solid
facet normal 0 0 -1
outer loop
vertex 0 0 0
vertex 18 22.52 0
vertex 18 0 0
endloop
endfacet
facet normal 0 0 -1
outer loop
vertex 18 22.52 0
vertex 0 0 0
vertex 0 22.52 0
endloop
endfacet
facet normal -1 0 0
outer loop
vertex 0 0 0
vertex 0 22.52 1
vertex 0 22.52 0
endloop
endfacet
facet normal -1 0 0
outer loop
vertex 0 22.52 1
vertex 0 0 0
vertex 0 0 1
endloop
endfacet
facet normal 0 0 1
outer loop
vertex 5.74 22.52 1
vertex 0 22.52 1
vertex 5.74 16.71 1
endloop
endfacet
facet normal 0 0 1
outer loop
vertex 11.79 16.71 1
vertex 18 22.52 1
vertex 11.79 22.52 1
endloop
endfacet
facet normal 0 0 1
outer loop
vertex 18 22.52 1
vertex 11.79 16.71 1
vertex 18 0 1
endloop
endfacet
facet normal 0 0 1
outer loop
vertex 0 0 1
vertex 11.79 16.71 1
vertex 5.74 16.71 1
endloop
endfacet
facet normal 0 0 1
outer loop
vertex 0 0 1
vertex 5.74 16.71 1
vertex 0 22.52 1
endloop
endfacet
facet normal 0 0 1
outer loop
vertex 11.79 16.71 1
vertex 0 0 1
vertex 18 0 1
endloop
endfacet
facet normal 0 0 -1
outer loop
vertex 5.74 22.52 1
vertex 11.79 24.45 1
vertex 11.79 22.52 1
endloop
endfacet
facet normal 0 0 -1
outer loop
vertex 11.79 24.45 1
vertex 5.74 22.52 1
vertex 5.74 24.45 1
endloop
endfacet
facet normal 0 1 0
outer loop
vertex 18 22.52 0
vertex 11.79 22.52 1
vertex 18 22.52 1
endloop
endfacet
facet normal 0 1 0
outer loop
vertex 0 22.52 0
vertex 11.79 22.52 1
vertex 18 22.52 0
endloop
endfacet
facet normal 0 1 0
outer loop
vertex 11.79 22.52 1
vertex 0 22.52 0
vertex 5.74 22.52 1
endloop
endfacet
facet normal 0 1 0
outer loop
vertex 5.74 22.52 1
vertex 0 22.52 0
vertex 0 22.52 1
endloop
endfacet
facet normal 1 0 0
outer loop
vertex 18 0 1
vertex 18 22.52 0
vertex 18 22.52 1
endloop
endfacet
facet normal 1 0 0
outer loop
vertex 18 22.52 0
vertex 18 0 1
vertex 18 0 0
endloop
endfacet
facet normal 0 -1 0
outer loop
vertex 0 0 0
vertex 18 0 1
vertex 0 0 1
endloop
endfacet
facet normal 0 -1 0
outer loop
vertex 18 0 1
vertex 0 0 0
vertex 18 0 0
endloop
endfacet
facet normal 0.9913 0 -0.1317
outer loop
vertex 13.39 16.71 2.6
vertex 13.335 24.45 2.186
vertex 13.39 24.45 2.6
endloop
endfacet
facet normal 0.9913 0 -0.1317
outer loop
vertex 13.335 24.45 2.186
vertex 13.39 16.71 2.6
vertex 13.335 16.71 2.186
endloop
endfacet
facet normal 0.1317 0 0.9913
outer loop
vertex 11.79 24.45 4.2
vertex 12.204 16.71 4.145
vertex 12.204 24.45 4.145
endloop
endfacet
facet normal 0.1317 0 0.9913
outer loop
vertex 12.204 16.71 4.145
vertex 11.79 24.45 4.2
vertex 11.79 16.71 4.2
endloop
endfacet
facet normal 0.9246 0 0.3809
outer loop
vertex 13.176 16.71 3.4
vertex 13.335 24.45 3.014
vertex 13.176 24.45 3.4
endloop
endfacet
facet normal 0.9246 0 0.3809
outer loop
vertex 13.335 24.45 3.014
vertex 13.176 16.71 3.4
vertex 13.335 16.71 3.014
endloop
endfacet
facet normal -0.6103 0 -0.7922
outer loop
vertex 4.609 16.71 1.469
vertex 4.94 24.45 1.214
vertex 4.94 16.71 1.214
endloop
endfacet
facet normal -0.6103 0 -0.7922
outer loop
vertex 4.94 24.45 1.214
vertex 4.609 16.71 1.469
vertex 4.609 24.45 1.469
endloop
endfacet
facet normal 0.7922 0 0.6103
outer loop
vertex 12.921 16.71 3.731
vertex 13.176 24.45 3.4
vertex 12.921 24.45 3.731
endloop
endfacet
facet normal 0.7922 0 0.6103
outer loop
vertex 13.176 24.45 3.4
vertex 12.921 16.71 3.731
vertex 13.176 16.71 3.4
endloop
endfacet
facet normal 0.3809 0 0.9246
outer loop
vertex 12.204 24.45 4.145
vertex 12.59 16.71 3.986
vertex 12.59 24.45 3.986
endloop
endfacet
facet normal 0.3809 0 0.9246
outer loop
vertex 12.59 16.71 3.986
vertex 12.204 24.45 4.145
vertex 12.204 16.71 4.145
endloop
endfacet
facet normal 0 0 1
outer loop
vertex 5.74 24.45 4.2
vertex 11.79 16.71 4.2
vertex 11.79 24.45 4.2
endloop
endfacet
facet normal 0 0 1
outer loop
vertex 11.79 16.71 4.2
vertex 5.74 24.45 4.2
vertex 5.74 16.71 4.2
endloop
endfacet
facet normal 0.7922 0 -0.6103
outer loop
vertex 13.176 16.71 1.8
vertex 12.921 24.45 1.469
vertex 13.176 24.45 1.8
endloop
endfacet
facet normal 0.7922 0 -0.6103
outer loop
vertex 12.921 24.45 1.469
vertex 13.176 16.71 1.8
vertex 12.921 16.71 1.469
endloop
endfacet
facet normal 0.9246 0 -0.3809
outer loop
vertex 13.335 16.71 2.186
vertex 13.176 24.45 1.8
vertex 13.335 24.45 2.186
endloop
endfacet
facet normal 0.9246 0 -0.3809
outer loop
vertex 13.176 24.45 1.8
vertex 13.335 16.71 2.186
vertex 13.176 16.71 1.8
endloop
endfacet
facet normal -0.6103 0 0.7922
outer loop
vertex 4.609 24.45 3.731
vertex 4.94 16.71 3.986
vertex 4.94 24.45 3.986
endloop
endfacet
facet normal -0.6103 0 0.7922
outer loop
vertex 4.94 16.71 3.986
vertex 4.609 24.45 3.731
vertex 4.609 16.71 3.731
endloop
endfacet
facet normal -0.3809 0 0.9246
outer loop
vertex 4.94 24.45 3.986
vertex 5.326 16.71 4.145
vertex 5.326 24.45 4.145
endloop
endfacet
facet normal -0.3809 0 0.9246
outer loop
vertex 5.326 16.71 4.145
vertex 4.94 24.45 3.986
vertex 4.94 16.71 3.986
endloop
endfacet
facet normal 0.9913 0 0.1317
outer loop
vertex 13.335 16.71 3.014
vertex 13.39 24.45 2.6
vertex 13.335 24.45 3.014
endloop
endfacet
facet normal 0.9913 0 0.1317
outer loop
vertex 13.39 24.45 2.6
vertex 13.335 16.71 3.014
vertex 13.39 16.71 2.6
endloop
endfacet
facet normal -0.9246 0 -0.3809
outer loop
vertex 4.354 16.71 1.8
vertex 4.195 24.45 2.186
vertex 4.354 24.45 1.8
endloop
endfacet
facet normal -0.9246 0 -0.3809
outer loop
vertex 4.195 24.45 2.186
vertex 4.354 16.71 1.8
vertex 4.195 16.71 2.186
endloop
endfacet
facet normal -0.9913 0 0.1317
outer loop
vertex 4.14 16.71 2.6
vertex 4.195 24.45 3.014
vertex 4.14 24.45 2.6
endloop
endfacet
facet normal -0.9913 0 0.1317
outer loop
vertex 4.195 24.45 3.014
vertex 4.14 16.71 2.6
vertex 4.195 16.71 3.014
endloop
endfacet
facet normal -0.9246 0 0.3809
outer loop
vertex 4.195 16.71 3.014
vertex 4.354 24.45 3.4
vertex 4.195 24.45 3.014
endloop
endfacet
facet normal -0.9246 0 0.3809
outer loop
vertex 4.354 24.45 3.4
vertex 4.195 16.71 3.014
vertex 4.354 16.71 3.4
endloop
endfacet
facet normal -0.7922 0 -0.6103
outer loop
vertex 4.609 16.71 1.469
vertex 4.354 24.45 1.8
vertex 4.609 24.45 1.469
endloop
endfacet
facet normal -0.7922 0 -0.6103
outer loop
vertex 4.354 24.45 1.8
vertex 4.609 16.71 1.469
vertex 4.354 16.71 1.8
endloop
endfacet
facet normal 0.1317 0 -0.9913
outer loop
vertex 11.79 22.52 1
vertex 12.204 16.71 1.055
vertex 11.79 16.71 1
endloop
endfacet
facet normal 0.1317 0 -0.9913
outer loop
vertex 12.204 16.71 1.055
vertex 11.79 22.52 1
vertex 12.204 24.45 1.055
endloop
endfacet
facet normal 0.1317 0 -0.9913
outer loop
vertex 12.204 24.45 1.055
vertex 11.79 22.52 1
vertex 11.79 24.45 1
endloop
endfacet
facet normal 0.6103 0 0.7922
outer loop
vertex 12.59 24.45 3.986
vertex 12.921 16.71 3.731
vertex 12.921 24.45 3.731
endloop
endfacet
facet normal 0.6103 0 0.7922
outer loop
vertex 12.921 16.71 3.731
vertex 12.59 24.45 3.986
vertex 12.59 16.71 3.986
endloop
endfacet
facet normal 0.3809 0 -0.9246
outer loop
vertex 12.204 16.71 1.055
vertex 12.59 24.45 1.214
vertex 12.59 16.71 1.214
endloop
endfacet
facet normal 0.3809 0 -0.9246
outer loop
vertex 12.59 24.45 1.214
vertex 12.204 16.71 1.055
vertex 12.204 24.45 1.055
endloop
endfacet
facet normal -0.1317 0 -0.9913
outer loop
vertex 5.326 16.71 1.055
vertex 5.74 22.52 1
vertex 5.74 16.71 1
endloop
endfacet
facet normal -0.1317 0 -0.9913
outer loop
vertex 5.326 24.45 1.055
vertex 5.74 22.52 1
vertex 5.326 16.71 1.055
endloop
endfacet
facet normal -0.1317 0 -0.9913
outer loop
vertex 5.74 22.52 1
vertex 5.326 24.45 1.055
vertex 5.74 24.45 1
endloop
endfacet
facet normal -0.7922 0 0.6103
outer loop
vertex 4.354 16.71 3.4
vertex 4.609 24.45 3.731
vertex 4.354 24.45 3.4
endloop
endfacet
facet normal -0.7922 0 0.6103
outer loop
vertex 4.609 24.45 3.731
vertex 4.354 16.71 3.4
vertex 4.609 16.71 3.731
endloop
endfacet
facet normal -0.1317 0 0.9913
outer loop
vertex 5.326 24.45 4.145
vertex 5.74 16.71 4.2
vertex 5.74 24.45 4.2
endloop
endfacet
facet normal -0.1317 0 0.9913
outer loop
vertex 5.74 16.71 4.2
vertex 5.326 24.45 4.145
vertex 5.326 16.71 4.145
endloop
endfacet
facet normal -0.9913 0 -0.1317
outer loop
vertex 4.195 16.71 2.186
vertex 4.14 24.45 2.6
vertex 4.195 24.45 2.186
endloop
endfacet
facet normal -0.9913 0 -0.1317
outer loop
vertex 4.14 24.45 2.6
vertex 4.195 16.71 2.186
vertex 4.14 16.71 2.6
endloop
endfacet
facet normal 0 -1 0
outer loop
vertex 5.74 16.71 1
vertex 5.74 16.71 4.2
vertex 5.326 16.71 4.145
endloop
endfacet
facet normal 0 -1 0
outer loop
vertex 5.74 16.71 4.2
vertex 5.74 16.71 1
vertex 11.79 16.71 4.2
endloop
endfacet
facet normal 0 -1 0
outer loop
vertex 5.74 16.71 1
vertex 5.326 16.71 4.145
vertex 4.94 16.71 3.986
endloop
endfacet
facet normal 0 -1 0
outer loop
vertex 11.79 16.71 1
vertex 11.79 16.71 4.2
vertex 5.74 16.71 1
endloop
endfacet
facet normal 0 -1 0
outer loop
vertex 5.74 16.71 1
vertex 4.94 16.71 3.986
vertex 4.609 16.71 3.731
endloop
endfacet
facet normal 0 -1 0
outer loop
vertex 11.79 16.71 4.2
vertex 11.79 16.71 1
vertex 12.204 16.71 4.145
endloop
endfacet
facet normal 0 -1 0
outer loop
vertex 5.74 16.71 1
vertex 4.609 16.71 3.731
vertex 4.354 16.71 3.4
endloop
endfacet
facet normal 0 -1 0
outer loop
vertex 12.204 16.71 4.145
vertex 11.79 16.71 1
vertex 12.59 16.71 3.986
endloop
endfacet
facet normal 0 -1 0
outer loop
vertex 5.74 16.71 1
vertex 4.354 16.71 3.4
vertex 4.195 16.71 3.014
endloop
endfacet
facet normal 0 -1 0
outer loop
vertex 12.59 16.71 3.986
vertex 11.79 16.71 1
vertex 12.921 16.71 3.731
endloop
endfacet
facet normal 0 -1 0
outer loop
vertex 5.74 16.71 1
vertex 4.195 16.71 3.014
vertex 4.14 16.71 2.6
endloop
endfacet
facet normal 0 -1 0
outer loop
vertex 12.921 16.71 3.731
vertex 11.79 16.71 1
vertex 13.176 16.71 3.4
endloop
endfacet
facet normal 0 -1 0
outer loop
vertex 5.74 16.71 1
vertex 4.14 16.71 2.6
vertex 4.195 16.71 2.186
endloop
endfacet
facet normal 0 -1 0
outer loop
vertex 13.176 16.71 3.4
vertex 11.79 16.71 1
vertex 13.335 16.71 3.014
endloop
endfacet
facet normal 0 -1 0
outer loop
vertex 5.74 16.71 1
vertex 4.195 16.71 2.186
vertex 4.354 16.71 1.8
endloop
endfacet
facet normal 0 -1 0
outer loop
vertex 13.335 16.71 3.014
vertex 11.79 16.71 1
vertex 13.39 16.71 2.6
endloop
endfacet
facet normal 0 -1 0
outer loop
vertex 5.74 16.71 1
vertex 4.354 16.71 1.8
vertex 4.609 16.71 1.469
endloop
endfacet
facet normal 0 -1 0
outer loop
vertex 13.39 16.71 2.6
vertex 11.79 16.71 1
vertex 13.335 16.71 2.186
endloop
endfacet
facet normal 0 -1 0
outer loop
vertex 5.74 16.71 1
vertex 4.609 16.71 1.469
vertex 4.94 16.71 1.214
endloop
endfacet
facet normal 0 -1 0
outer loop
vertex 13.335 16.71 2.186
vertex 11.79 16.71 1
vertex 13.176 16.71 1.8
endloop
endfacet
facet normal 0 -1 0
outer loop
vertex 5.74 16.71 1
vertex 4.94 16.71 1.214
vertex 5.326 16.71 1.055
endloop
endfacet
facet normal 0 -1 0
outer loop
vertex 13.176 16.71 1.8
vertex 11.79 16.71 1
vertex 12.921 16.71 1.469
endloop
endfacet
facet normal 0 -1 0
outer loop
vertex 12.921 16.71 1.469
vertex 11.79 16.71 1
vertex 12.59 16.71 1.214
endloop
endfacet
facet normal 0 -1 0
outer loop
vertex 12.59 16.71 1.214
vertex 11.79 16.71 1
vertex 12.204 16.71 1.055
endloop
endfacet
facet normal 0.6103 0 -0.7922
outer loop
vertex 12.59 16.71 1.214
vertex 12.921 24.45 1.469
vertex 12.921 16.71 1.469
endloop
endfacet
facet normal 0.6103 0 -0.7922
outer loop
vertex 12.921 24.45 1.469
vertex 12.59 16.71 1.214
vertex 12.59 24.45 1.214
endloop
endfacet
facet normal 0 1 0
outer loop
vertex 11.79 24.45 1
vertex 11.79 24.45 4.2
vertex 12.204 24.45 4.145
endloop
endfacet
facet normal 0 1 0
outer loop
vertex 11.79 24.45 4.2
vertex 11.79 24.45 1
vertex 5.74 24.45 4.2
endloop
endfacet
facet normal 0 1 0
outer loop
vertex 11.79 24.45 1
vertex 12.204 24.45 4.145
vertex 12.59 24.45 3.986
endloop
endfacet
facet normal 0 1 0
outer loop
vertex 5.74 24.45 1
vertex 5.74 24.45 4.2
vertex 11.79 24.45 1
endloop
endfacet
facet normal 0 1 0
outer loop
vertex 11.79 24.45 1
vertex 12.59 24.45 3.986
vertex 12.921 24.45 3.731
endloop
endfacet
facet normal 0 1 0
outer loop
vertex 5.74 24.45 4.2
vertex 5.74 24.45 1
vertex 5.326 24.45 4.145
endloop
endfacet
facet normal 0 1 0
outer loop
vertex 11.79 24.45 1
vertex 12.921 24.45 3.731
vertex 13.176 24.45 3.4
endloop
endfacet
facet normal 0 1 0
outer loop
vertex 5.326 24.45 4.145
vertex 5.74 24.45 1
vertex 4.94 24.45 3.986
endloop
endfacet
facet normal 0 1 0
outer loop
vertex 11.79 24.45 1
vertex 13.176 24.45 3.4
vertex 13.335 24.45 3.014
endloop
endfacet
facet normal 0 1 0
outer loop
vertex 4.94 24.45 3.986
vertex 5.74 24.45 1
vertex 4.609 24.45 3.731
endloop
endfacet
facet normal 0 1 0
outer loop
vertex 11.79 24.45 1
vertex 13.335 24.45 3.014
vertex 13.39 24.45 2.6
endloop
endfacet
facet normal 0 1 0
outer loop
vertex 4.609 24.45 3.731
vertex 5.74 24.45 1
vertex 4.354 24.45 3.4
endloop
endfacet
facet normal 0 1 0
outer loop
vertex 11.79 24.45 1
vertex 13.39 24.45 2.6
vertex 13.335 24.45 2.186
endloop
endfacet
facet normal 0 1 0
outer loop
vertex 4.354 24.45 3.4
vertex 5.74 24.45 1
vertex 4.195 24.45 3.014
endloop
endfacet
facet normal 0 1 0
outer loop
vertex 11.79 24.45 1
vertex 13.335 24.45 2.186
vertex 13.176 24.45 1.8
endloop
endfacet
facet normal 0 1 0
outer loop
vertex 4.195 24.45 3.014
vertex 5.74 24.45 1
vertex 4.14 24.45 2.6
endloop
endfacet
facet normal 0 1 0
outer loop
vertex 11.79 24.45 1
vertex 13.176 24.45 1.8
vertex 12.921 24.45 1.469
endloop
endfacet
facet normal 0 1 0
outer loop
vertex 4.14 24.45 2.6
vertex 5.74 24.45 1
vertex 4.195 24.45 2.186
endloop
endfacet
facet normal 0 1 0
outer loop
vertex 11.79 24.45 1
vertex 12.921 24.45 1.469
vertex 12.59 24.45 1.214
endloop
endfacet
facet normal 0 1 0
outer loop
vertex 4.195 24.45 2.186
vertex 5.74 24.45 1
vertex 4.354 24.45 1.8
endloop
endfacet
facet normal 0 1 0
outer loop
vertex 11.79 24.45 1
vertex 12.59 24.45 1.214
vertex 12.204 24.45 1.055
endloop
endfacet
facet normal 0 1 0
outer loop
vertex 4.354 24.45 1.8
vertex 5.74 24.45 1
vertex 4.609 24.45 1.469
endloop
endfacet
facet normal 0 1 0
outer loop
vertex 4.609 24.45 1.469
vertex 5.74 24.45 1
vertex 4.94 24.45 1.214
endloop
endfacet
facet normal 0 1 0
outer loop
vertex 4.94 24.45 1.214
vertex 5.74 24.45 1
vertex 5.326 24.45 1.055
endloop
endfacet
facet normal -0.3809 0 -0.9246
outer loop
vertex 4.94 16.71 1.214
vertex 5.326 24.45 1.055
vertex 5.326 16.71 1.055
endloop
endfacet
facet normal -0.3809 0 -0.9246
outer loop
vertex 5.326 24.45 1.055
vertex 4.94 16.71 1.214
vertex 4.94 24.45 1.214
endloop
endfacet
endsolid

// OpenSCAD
// A development board of the parts library (packages/contracts/src/parts/dev-boards.ts), at the layout given as -D overrides
// (`devBoardLayout`): the PCB with its pin holes (and their half holes at the edge, for a castellated board), the USB-C
// receptacle and every component as a box. `npm run check:assembly` renders it to check the boards a model holds, so that a
// case's walls, posts and openings can be tested against the receptacle and the components.
// Frame: millimetres, as the layout: the PCB's underside on z = 0 with its corner at the origin, its width along X and its length
// along Y, the receptacle at the +Y end, components on top.
// The defaults are the ESP32-C3 SuperMini's outline, with no pins or components.

L = 22.52;              // board length
W = 18;                 // board width
T = 1;                  // PCB thickness
R = 0;                  // corner radius
HOLE = 1;               // pin hole diameter
CASTELLATED = false;    // a half hole at the board's edge beside each pin
PINS = [];              // [x, y] of each pin hole
USB = [4.14, 16.71, 13.39, 24.45, 3.2];      // [x0, y0, x1, y1, height above the PCB]
// [x, y, width (X), length (Y), height above the PCB, rotation about Z in degrees, top shape (0 none, 1 round, 2 oval,
// 3 rectangle), top width, top length, top's height above the PCB]: the body, and a button's plunger or an LED's lens on it
COMPONENTS = [];

$fn = 24;

module outline() {
  if (R > 0) translate([R, R]) offset(r = R) square([W - 2 * R, L - 2 * R]);
  else square([W, L]);
}

difference() {
  linear_extrude(T) outline();
  for (pin = PINS) {
    translate([pin[0], pin[1], -1]) cylinder(d = HOLE, h = T + 2);
    if (CASTELLATED) translate([pin[0] < W / 2 ? 0 : W, pin[1], -1]) cylinder(d = HOLE, h = T + 2);
  }
}

// the receptacle's shell: a stadium across X and up Z, along Y
hull() for (x = [USB[0] + USB[4] / 2, USB[2] - USB[4] / 2])
  translate([x, USB[1], T + USB[4] / 2]) rotate([-90, 0, 0]) cylinder(d = USB[4], h = USB[3] - USB[1]);

module top_plan(shape, width, length) {
  if (shape == 1) circle(d = width);
  else if (shape == 2) hull() for (s = [-1, 1]) translate(width < length ? [0, s * (length - width) / 2] : [s * (width - length) / 2, 0]) circle(d = min(width, length));
  else square([width, length], center = true);
}

for (c = COMPONENTS) translate([c[0], c[1], T]) rotate([0, 0, c[5]]) {
  translate([-c[2] / 2, -c[3] / 2, 0]) cube([c[2], c[3], c[4]]);
  if (len(c) > 6 && c[6] > 0) translate([0, 0, c[4] - 0.01]) linear_extrude(c[9] - c[4] + 0.01) top_plan(c[6], c[7], c[8]);
}
